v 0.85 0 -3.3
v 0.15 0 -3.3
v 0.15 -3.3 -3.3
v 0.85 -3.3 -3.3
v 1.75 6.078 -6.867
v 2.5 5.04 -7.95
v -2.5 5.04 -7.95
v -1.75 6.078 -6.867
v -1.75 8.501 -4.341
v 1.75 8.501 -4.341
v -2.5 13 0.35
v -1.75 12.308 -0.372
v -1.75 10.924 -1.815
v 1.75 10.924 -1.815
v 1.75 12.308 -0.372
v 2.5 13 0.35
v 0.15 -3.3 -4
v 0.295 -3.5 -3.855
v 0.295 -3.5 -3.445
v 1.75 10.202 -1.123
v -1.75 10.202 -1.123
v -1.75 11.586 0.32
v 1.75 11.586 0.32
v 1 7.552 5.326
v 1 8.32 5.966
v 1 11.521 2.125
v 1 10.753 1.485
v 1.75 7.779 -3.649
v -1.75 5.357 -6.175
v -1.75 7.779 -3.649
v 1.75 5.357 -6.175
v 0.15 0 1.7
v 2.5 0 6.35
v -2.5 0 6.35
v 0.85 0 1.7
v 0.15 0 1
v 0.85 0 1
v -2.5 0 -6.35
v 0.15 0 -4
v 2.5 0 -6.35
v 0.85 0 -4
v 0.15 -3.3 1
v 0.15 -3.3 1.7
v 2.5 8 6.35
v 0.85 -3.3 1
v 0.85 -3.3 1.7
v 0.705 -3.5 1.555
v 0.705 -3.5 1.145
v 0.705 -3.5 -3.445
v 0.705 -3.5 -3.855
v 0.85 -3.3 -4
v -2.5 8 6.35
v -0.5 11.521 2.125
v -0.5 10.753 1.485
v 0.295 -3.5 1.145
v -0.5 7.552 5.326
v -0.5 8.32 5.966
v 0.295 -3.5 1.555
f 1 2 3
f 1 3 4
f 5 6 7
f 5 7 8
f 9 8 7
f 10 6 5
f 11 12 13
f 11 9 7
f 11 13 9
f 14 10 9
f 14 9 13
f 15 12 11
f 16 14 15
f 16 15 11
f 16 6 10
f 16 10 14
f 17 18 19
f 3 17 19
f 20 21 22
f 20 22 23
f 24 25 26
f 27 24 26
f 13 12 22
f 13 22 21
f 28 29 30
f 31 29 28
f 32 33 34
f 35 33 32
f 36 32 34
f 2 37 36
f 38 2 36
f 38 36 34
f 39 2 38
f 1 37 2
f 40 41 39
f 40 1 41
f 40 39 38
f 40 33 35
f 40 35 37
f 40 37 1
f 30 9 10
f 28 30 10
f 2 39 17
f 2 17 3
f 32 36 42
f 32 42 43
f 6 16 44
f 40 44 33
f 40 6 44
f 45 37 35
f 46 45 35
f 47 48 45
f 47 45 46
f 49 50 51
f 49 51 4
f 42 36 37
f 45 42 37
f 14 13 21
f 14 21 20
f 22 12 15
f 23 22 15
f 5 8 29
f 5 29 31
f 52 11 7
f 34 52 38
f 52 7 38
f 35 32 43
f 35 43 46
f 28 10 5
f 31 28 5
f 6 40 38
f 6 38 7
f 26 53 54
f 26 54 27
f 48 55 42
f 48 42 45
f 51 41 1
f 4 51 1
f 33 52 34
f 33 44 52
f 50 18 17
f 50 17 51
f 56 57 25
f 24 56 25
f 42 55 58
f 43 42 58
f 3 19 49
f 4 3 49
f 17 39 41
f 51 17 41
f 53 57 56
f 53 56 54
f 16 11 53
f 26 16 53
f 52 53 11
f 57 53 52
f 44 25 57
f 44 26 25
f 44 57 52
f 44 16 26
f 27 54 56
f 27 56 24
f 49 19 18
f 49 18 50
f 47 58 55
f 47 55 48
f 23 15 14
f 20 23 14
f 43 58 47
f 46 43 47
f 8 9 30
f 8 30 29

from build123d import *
from OCP.BRepFilletAPI import BRepFilletAPI_MakeChamfer

# Parameters (mm, degrees)
EXTRUDE_2_DEPTH     = 2.5
SKETCH_4_W          = 3.5
SKETCH_4_H          = 2
SKETCH_4_H_2        = 3.5
CUT_EXTRUDE_1_DEPTH = 1
SKETCH_5_W          = 1.5
SKETCH_5_H          = 5
CUT_EXTRUDE_2_DEPTH = 1
SKETCH_6_W          = 0.7
SKETCH_6_H          = 0.7
EXTRUDE_3_DEPTH     = 3.5
CHAMFER_3_SIZE      = 0.2
CHAMFER_3_SIZE2     = 0.145308506


with BuildPart() as part:
    # Эскиз2 → Бобышка-Вытянуть2 (new, symmetric)
    with BuildSketch(Plane(origin=(0, 0, 0), x_dir=(0, -1, 0), z_dir=(1, 0, 0))):
        Polygon((0, -6.35), (0, 6.35), (-5.040100503, 7.95), (-13, -0.35), (-8, -6.35), align=None)
    extrude(amount=EXTRUDE_2_DEPTH, both=True)

    # Эскиз4 → Вырез-Вытянуть1 (cut)
    with BuildSketch(Plane(origin=(0, 6.5969489, -6.326632557), x_dir=(1, 0, 0), z_dir=(0, 0.7217391304347853, -0.6921651736393851))):
        with Locations((0, -7.250755953)):
            Rectangle(SKETCH_4_W, SKETCH_4_H)
        with Locations((0, -1.000755953)):
            Rectangle(SKETCH_4_W, SKETCH_4_H_2)
    extrude(amount=-CUT_EXTRUDE_1_DEPTH, mode=Mode.SUBTRACT)

    # Эскиз5 → Вырез-Вытянуть2 (cut)
    with BuildSketch(Plane(origin=(0, 7.844262295, 6.536885246), x_dir=(1, 0, 0), z_dir=(0, 0.7682212795973735, 0.6401843996644827))):
        with Locations((0.25, 3.243270072)):
            Rectangle(SKETCH_5_W, SKETCH_5_H)
    extrude(amount=-CUT_EXTRUDE_2_DEPTH, mode=Mode.SUBTRACT)

    # Эскиз6 → Бобышка-Вытянуть3 (add)
    with BuildSketch(Plane.XZ):
        with Locations((0.5, 1.35)):
            Rectangle(SKETCH_6_W, SKETCH_6_H)
        with Locations((0.5, -3.65)):
            Rectangle(SKETCH_6_W, SKETCH_6_H)
    extrude(amount=EXTRUDE_3_DEPTH)

    # Фаска3: one chamfer whose edges measure the first distance from different faces: ONE call of the kernel's chamfer builder (chamfer() names one face for all edges)
    chamfer_3_edges_1 = [part.edges().sort_by_distance(p)[0] for p in [
        (0.15, -3.5, 1.35),
    ]]
    chamfer_3_side_1 = [part.faces().sort_by_distance(p)[0] for p in [
        (0.15, -1.75, 1.35),
    ]]
    chamfer_3_edges_2 = [part.edges().sort_by_distance(p)[0] for p in [
        (0.5, -3.5, 1),
    ]]
    chamfer_3_side_2 = [part.faces().sort_by_distance(p)[0] for p in [
        (0.5, -1.75, 1),
    ]]
    chamfer_3_edges_3 = [part.edges().sort_by_distance(p)[0] for p in [
        (0.85, -3.5, 1.35),
    ]]
    chamfer_3_side_3 = [part.faces().sort_by_distance(p)[0] for p in [
        (0.85, -1.75, 1.35),
    ]]
    chamfer_3_edges_4 = [part.edges().sort_by_distance(p)[0] for p in [
        (0.5, -3.5, 1.7),
    ]]
    chamfer_3_side_4 = [part.faces().sort_by_distance(p)[0] for p in [
        (0.5, -1.75, 1.7),
    ]]
    chamfer_3_edges_5 = [part.edges().sort_by_distance(p)[0] for p in [
        (0.15, -3.5, -3.65),
    ]]
    chamfer_3_side_5 = [part.faces().sort_by_distance(p)[0] for p in [
        (0.15, -1.75, -3.65),
    ]]
    chamfer_3_edges_6 = [part.edges().sort_by_distance(p)[0] for p in [
        (0.5, -3.5, -4),
    ]]
    chamfer_3_side_6 = [part.faces().sort_by_distance(p)[0] for p in [
        (0.5, -1.75, -4),
    ]]
    chamfer_3_edges_7 = [part.edges().sort_by_distance(p)[0] for p in [
        (0.85, -3.5, -3.65),
    ]]
    chamfer_3_side_7 = [part.faces().sort_by_distance(p)[0] for p in [
        (0.85, -1.75, -3.65),
    ]]
    chamfer_3_edges_8 = [part.edges().sort_by_distance(p)[0] for p in [
        (0.5, -3.5, -3.3),
    ]]
    chamfer_3_side_8 = [part.faces().sort_by_distance(p)[0] for p in [
        (0.5, -1.75, -3.3),
    ]]
    chamfer_3 = BRepFilletAPI_MakeChamfer(part.part.solid().wrapped)
    for e in chamfer_3_edges_1:
        chamfer_3.Add(CHAMFER_3_SIZE, CHAMFER_3_SIZE2, e.wrapped, chamfer_3_side_1[0].wrapped)  # the first distance lies on this face
    for e in chamfer_3_edges_2:
        chamfer_3.Add(CHAMFER_3_SIZE, CHAMFER_3_SIZE2, e.wrapped, chamfer_3_side_2[0].wrapped)  # the first distance lies on this face
    for e in chamfer_3_edges_3:
        chamfer_3.Add(CHAMFER_3_SIZE, CHAMFER_3_SIZE2, e.wrapped, chamfer_3_side_3[0].wrapped)  # the first distance lies on this face
    for e in chamfer_3_edges_4:
        chamfer_3.Add(CHAMFER_3_SIZE, CHAMFER_3_SIZE2, e.wrapped, chamfer_3_side_4[0].wrapped)  # the first distance lies on this face
    for e in chamfer_3_edges_5:
        chamfer_3.Add(CHAMFER_3_SIZE, CHAMFER_3_SIZE2, e.wrapped, chamfer_3_side_5[0].wrapped)  # the first distance lies on this face
    for e in chamfer_3_edges_6:
        chamfer_3.Add(CHAMFER_3_SIZE, CHAMFER_3_SIZE2, e.wrapped, chamfer_3_side_6[0].wrapped)  # the first distance lies on this face
    for e in chamfer_3_edges_7:
        chamfer_3.Add(CHAMFER_3_SIZE, CHAMFER_3_SIZE2, e.wrapped, chamfer_3_side_7[0].wrapped)  # the first distance lies on this face
    for e in chamfer_3_edges_8:
        chamfer_3.Add(CHAMFER_3_SIZE, CHAMFER_3_SIZE2, e.wrapped, chamfer_3_side_8[0].wrapped)  # the first distance lies on this face
    add(Compound.cast(chamfer_3.Shape()), mode=Mode.REPLACE)


solid = part.part
